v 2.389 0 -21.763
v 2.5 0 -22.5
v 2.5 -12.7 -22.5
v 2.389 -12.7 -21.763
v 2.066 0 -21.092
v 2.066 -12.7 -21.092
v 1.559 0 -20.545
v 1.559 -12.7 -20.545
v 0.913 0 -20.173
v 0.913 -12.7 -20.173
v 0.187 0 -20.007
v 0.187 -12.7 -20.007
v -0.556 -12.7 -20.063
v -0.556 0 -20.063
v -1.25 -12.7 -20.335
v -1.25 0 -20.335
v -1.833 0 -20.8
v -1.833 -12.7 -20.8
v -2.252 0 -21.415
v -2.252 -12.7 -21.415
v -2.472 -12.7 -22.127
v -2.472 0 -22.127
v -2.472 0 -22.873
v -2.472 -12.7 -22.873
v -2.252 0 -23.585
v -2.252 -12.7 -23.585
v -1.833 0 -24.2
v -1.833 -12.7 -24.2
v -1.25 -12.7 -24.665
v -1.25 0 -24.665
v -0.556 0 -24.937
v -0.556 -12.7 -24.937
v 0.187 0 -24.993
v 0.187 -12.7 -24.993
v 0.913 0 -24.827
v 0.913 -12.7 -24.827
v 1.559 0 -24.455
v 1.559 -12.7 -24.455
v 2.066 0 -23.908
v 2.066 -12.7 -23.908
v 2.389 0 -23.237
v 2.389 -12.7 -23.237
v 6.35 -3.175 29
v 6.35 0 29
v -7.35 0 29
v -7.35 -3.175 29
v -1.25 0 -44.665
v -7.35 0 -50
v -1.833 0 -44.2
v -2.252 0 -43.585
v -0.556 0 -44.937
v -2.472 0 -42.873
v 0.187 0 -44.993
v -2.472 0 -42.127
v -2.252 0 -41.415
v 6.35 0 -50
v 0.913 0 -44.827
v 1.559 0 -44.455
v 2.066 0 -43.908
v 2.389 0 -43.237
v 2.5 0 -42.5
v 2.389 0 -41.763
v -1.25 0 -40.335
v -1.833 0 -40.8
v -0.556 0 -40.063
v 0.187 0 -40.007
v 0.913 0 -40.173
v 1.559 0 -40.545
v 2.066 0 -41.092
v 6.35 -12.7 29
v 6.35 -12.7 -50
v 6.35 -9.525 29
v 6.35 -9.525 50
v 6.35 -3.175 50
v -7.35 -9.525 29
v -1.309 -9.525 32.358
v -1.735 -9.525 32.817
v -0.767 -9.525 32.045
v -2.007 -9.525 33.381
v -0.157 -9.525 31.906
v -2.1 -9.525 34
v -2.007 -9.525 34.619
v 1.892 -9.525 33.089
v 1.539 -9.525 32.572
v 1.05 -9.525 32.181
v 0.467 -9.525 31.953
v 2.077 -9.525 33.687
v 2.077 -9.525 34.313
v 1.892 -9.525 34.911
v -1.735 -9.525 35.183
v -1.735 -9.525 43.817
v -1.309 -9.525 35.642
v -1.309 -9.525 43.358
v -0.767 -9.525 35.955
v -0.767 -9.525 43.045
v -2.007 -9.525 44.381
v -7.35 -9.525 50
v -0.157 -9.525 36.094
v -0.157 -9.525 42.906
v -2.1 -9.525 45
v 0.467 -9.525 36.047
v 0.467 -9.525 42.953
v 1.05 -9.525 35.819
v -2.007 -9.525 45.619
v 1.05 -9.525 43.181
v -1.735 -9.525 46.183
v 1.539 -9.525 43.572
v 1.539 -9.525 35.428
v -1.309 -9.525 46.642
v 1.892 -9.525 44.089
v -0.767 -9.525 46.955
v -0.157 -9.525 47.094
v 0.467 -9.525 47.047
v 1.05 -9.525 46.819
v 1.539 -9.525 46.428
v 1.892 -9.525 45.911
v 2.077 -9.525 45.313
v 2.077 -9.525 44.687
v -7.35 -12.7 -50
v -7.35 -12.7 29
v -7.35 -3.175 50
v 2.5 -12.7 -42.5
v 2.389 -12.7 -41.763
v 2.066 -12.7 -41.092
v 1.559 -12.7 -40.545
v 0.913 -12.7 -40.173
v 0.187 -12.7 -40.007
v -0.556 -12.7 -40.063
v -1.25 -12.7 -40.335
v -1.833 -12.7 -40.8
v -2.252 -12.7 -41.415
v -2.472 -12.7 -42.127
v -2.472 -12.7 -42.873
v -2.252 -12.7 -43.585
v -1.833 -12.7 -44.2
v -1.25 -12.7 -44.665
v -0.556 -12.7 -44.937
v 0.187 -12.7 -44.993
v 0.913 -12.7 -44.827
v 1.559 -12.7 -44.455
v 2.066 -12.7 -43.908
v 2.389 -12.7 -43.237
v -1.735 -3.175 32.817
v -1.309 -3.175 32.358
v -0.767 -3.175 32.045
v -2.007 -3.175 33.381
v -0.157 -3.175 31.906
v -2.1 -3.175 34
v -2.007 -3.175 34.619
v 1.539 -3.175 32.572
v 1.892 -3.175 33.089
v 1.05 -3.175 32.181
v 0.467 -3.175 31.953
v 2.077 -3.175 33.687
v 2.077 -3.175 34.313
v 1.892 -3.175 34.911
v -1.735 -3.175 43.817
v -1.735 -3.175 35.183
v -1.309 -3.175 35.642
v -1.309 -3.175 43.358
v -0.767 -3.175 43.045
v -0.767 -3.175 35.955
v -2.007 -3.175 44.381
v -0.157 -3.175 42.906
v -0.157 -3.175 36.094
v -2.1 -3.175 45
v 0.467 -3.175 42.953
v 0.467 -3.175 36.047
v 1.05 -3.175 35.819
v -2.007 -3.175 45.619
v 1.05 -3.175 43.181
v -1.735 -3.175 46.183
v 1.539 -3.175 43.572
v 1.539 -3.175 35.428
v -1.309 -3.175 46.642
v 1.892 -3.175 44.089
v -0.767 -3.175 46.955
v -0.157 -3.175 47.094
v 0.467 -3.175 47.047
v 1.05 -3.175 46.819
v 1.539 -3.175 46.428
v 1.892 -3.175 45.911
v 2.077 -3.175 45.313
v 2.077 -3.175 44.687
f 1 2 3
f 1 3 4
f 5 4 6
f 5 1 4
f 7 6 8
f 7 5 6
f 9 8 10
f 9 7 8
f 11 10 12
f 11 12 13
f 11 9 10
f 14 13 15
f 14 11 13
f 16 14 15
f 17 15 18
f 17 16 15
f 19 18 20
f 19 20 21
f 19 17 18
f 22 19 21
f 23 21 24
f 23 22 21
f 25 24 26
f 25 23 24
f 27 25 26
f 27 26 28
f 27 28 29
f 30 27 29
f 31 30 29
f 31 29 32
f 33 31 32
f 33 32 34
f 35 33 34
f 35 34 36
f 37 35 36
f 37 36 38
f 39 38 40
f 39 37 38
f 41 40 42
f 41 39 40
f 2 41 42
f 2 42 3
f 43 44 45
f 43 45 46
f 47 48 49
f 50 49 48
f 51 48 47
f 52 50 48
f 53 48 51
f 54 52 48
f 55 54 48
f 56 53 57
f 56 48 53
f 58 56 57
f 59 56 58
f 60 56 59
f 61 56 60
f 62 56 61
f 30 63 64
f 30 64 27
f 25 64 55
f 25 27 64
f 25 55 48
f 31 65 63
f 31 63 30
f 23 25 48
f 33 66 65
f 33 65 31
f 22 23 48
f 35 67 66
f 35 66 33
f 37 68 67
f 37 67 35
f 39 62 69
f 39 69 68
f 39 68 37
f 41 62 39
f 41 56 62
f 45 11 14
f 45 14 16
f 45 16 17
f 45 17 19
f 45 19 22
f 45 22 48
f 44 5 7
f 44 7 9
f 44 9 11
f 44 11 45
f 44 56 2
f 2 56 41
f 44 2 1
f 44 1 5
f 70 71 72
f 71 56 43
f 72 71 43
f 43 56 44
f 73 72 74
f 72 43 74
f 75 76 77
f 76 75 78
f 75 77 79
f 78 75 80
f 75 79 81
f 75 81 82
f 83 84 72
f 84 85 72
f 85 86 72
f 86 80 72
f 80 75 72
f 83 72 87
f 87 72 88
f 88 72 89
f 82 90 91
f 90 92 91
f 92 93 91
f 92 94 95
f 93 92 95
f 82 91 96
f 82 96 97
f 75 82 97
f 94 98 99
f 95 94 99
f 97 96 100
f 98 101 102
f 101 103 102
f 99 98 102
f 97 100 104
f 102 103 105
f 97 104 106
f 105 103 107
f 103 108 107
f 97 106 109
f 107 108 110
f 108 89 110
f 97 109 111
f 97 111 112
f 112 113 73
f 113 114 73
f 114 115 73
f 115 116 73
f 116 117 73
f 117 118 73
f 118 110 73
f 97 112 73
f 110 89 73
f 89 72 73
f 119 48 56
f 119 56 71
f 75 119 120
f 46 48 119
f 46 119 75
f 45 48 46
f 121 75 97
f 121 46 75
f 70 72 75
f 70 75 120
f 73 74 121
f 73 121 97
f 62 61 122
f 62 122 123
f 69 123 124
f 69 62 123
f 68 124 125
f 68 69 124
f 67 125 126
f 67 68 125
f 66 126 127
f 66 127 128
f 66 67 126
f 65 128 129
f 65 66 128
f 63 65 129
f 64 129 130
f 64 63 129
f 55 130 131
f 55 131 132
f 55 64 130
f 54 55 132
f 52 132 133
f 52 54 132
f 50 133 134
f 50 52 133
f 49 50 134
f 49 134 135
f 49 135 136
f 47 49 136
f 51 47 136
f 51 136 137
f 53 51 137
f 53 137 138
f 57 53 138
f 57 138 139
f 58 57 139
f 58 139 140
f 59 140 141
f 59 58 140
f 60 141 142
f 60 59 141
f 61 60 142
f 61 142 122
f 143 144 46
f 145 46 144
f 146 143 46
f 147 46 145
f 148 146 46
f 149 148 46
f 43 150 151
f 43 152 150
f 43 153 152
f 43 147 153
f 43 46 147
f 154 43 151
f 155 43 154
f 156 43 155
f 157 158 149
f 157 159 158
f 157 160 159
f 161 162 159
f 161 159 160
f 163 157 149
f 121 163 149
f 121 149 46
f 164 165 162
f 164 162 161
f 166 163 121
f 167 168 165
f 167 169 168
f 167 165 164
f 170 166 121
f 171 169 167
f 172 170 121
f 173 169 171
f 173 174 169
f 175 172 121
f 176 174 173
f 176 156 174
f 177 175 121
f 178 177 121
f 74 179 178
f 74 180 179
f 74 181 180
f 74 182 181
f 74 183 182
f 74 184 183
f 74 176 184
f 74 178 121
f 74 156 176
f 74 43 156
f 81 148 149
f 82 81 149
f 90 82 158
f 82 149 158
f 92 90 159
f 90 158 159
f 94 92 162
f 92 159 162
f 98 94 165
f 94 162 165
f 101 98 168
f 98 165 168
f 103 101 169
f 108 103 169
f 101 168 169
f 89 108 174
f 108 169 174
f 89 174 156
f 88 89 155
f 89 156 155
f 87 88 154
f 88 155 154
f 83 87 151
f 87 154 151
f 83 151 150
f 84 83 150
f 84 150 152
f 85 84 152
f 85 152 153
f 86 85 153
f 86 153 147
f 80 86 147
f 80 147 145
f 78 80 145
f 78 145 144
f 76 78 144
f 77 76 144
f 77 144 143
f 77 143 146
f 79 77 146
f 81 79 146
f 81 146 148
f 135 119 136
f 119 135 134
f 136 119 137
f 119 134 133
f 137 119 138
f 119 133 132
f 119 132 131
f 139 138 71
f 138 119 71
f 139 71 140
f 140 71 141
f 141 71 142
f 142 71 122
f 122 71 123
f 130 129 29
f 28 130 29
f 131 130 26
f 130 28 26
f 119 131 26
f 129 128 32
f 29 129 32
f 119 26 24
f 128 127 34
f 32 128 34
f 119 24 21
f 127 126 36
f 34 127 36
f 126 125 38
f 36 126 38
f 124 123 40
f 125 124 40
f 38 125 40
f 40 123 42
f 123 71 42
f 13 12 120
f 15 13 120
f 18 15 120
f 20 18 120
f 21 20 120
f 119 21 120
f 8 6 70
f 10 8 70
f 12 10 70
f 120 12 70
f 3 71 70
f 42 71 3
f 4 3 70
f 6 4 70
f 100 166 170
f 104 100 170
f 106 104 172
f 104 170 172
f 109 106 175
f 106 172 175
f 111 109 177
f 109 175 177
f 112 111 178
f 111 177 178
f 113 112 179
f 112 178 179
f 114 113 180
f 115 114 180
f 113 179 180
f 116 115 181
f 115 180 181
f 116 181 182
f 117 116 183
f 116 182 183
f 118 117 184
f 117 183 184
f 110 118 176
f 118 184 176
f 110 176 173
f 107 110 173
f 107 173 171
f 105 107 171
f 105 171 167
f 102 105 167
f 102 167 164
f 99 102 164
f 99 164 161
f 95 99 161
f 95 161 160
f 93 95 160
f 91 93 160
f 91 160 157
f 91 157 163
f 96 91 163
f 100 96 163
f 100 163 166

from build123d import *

# Parameters (mm, degrees)
F0_W     = 12.7
F0_H     = 100
F0_R     = 2.5
F1_DEPTH = 12.7
F3_D     = 4.2
F4_W     = 3.175
F4_H     = 21
F5_DEPTH = 12.701
F6_DEPTH = 1


with BuildPart() as f1:
    # F0 (on Front) → F1 (new body)
    with BuildSketch(Plane.XZ):
        Rectangle(F0_W, F0_H)
        with Locations((0, -42.5)):
            Circle(F0_R, mode=Mode.SUBTRACT)
        with Locations((0, -22.5)):
            Circle(F0_R, mode=Mode.SUBTRACT)
    extrude(amount=F1_DEPTH)

    # F3 (through all)
    with Locations(Plane.XZ.offset(12.7)):
        with Locations((0, 45), (0, 34)):
            Hole(F3_D / 2)

    # F4 (on face) → F5 (cut, through all)
    with BuildSketch(Plane(origin=(-6.35, 0, 0), x_dir=(0, -1, 0), z_dir=(-1, 0, 0))):
        with Locations((1.5875, 39.5)):
            Rectangle(F4_W, F4_H)
        with Locations((11.1125, 39.5)):
            Rectangle(F4_W, F4_H)
    extrude(amount=-F5_DEPTH, mode=Mode.SUBTRACT)

    # F6 (add): a face of the model
    f6_faces = [f1.faces().sort_by_distance(p)[0] for p in [
        (-6.35, -6.35, -4.6340782123),
    ]]
    extrude(f6_faces, amount=F6_DEPTH)


solid = f1.part
